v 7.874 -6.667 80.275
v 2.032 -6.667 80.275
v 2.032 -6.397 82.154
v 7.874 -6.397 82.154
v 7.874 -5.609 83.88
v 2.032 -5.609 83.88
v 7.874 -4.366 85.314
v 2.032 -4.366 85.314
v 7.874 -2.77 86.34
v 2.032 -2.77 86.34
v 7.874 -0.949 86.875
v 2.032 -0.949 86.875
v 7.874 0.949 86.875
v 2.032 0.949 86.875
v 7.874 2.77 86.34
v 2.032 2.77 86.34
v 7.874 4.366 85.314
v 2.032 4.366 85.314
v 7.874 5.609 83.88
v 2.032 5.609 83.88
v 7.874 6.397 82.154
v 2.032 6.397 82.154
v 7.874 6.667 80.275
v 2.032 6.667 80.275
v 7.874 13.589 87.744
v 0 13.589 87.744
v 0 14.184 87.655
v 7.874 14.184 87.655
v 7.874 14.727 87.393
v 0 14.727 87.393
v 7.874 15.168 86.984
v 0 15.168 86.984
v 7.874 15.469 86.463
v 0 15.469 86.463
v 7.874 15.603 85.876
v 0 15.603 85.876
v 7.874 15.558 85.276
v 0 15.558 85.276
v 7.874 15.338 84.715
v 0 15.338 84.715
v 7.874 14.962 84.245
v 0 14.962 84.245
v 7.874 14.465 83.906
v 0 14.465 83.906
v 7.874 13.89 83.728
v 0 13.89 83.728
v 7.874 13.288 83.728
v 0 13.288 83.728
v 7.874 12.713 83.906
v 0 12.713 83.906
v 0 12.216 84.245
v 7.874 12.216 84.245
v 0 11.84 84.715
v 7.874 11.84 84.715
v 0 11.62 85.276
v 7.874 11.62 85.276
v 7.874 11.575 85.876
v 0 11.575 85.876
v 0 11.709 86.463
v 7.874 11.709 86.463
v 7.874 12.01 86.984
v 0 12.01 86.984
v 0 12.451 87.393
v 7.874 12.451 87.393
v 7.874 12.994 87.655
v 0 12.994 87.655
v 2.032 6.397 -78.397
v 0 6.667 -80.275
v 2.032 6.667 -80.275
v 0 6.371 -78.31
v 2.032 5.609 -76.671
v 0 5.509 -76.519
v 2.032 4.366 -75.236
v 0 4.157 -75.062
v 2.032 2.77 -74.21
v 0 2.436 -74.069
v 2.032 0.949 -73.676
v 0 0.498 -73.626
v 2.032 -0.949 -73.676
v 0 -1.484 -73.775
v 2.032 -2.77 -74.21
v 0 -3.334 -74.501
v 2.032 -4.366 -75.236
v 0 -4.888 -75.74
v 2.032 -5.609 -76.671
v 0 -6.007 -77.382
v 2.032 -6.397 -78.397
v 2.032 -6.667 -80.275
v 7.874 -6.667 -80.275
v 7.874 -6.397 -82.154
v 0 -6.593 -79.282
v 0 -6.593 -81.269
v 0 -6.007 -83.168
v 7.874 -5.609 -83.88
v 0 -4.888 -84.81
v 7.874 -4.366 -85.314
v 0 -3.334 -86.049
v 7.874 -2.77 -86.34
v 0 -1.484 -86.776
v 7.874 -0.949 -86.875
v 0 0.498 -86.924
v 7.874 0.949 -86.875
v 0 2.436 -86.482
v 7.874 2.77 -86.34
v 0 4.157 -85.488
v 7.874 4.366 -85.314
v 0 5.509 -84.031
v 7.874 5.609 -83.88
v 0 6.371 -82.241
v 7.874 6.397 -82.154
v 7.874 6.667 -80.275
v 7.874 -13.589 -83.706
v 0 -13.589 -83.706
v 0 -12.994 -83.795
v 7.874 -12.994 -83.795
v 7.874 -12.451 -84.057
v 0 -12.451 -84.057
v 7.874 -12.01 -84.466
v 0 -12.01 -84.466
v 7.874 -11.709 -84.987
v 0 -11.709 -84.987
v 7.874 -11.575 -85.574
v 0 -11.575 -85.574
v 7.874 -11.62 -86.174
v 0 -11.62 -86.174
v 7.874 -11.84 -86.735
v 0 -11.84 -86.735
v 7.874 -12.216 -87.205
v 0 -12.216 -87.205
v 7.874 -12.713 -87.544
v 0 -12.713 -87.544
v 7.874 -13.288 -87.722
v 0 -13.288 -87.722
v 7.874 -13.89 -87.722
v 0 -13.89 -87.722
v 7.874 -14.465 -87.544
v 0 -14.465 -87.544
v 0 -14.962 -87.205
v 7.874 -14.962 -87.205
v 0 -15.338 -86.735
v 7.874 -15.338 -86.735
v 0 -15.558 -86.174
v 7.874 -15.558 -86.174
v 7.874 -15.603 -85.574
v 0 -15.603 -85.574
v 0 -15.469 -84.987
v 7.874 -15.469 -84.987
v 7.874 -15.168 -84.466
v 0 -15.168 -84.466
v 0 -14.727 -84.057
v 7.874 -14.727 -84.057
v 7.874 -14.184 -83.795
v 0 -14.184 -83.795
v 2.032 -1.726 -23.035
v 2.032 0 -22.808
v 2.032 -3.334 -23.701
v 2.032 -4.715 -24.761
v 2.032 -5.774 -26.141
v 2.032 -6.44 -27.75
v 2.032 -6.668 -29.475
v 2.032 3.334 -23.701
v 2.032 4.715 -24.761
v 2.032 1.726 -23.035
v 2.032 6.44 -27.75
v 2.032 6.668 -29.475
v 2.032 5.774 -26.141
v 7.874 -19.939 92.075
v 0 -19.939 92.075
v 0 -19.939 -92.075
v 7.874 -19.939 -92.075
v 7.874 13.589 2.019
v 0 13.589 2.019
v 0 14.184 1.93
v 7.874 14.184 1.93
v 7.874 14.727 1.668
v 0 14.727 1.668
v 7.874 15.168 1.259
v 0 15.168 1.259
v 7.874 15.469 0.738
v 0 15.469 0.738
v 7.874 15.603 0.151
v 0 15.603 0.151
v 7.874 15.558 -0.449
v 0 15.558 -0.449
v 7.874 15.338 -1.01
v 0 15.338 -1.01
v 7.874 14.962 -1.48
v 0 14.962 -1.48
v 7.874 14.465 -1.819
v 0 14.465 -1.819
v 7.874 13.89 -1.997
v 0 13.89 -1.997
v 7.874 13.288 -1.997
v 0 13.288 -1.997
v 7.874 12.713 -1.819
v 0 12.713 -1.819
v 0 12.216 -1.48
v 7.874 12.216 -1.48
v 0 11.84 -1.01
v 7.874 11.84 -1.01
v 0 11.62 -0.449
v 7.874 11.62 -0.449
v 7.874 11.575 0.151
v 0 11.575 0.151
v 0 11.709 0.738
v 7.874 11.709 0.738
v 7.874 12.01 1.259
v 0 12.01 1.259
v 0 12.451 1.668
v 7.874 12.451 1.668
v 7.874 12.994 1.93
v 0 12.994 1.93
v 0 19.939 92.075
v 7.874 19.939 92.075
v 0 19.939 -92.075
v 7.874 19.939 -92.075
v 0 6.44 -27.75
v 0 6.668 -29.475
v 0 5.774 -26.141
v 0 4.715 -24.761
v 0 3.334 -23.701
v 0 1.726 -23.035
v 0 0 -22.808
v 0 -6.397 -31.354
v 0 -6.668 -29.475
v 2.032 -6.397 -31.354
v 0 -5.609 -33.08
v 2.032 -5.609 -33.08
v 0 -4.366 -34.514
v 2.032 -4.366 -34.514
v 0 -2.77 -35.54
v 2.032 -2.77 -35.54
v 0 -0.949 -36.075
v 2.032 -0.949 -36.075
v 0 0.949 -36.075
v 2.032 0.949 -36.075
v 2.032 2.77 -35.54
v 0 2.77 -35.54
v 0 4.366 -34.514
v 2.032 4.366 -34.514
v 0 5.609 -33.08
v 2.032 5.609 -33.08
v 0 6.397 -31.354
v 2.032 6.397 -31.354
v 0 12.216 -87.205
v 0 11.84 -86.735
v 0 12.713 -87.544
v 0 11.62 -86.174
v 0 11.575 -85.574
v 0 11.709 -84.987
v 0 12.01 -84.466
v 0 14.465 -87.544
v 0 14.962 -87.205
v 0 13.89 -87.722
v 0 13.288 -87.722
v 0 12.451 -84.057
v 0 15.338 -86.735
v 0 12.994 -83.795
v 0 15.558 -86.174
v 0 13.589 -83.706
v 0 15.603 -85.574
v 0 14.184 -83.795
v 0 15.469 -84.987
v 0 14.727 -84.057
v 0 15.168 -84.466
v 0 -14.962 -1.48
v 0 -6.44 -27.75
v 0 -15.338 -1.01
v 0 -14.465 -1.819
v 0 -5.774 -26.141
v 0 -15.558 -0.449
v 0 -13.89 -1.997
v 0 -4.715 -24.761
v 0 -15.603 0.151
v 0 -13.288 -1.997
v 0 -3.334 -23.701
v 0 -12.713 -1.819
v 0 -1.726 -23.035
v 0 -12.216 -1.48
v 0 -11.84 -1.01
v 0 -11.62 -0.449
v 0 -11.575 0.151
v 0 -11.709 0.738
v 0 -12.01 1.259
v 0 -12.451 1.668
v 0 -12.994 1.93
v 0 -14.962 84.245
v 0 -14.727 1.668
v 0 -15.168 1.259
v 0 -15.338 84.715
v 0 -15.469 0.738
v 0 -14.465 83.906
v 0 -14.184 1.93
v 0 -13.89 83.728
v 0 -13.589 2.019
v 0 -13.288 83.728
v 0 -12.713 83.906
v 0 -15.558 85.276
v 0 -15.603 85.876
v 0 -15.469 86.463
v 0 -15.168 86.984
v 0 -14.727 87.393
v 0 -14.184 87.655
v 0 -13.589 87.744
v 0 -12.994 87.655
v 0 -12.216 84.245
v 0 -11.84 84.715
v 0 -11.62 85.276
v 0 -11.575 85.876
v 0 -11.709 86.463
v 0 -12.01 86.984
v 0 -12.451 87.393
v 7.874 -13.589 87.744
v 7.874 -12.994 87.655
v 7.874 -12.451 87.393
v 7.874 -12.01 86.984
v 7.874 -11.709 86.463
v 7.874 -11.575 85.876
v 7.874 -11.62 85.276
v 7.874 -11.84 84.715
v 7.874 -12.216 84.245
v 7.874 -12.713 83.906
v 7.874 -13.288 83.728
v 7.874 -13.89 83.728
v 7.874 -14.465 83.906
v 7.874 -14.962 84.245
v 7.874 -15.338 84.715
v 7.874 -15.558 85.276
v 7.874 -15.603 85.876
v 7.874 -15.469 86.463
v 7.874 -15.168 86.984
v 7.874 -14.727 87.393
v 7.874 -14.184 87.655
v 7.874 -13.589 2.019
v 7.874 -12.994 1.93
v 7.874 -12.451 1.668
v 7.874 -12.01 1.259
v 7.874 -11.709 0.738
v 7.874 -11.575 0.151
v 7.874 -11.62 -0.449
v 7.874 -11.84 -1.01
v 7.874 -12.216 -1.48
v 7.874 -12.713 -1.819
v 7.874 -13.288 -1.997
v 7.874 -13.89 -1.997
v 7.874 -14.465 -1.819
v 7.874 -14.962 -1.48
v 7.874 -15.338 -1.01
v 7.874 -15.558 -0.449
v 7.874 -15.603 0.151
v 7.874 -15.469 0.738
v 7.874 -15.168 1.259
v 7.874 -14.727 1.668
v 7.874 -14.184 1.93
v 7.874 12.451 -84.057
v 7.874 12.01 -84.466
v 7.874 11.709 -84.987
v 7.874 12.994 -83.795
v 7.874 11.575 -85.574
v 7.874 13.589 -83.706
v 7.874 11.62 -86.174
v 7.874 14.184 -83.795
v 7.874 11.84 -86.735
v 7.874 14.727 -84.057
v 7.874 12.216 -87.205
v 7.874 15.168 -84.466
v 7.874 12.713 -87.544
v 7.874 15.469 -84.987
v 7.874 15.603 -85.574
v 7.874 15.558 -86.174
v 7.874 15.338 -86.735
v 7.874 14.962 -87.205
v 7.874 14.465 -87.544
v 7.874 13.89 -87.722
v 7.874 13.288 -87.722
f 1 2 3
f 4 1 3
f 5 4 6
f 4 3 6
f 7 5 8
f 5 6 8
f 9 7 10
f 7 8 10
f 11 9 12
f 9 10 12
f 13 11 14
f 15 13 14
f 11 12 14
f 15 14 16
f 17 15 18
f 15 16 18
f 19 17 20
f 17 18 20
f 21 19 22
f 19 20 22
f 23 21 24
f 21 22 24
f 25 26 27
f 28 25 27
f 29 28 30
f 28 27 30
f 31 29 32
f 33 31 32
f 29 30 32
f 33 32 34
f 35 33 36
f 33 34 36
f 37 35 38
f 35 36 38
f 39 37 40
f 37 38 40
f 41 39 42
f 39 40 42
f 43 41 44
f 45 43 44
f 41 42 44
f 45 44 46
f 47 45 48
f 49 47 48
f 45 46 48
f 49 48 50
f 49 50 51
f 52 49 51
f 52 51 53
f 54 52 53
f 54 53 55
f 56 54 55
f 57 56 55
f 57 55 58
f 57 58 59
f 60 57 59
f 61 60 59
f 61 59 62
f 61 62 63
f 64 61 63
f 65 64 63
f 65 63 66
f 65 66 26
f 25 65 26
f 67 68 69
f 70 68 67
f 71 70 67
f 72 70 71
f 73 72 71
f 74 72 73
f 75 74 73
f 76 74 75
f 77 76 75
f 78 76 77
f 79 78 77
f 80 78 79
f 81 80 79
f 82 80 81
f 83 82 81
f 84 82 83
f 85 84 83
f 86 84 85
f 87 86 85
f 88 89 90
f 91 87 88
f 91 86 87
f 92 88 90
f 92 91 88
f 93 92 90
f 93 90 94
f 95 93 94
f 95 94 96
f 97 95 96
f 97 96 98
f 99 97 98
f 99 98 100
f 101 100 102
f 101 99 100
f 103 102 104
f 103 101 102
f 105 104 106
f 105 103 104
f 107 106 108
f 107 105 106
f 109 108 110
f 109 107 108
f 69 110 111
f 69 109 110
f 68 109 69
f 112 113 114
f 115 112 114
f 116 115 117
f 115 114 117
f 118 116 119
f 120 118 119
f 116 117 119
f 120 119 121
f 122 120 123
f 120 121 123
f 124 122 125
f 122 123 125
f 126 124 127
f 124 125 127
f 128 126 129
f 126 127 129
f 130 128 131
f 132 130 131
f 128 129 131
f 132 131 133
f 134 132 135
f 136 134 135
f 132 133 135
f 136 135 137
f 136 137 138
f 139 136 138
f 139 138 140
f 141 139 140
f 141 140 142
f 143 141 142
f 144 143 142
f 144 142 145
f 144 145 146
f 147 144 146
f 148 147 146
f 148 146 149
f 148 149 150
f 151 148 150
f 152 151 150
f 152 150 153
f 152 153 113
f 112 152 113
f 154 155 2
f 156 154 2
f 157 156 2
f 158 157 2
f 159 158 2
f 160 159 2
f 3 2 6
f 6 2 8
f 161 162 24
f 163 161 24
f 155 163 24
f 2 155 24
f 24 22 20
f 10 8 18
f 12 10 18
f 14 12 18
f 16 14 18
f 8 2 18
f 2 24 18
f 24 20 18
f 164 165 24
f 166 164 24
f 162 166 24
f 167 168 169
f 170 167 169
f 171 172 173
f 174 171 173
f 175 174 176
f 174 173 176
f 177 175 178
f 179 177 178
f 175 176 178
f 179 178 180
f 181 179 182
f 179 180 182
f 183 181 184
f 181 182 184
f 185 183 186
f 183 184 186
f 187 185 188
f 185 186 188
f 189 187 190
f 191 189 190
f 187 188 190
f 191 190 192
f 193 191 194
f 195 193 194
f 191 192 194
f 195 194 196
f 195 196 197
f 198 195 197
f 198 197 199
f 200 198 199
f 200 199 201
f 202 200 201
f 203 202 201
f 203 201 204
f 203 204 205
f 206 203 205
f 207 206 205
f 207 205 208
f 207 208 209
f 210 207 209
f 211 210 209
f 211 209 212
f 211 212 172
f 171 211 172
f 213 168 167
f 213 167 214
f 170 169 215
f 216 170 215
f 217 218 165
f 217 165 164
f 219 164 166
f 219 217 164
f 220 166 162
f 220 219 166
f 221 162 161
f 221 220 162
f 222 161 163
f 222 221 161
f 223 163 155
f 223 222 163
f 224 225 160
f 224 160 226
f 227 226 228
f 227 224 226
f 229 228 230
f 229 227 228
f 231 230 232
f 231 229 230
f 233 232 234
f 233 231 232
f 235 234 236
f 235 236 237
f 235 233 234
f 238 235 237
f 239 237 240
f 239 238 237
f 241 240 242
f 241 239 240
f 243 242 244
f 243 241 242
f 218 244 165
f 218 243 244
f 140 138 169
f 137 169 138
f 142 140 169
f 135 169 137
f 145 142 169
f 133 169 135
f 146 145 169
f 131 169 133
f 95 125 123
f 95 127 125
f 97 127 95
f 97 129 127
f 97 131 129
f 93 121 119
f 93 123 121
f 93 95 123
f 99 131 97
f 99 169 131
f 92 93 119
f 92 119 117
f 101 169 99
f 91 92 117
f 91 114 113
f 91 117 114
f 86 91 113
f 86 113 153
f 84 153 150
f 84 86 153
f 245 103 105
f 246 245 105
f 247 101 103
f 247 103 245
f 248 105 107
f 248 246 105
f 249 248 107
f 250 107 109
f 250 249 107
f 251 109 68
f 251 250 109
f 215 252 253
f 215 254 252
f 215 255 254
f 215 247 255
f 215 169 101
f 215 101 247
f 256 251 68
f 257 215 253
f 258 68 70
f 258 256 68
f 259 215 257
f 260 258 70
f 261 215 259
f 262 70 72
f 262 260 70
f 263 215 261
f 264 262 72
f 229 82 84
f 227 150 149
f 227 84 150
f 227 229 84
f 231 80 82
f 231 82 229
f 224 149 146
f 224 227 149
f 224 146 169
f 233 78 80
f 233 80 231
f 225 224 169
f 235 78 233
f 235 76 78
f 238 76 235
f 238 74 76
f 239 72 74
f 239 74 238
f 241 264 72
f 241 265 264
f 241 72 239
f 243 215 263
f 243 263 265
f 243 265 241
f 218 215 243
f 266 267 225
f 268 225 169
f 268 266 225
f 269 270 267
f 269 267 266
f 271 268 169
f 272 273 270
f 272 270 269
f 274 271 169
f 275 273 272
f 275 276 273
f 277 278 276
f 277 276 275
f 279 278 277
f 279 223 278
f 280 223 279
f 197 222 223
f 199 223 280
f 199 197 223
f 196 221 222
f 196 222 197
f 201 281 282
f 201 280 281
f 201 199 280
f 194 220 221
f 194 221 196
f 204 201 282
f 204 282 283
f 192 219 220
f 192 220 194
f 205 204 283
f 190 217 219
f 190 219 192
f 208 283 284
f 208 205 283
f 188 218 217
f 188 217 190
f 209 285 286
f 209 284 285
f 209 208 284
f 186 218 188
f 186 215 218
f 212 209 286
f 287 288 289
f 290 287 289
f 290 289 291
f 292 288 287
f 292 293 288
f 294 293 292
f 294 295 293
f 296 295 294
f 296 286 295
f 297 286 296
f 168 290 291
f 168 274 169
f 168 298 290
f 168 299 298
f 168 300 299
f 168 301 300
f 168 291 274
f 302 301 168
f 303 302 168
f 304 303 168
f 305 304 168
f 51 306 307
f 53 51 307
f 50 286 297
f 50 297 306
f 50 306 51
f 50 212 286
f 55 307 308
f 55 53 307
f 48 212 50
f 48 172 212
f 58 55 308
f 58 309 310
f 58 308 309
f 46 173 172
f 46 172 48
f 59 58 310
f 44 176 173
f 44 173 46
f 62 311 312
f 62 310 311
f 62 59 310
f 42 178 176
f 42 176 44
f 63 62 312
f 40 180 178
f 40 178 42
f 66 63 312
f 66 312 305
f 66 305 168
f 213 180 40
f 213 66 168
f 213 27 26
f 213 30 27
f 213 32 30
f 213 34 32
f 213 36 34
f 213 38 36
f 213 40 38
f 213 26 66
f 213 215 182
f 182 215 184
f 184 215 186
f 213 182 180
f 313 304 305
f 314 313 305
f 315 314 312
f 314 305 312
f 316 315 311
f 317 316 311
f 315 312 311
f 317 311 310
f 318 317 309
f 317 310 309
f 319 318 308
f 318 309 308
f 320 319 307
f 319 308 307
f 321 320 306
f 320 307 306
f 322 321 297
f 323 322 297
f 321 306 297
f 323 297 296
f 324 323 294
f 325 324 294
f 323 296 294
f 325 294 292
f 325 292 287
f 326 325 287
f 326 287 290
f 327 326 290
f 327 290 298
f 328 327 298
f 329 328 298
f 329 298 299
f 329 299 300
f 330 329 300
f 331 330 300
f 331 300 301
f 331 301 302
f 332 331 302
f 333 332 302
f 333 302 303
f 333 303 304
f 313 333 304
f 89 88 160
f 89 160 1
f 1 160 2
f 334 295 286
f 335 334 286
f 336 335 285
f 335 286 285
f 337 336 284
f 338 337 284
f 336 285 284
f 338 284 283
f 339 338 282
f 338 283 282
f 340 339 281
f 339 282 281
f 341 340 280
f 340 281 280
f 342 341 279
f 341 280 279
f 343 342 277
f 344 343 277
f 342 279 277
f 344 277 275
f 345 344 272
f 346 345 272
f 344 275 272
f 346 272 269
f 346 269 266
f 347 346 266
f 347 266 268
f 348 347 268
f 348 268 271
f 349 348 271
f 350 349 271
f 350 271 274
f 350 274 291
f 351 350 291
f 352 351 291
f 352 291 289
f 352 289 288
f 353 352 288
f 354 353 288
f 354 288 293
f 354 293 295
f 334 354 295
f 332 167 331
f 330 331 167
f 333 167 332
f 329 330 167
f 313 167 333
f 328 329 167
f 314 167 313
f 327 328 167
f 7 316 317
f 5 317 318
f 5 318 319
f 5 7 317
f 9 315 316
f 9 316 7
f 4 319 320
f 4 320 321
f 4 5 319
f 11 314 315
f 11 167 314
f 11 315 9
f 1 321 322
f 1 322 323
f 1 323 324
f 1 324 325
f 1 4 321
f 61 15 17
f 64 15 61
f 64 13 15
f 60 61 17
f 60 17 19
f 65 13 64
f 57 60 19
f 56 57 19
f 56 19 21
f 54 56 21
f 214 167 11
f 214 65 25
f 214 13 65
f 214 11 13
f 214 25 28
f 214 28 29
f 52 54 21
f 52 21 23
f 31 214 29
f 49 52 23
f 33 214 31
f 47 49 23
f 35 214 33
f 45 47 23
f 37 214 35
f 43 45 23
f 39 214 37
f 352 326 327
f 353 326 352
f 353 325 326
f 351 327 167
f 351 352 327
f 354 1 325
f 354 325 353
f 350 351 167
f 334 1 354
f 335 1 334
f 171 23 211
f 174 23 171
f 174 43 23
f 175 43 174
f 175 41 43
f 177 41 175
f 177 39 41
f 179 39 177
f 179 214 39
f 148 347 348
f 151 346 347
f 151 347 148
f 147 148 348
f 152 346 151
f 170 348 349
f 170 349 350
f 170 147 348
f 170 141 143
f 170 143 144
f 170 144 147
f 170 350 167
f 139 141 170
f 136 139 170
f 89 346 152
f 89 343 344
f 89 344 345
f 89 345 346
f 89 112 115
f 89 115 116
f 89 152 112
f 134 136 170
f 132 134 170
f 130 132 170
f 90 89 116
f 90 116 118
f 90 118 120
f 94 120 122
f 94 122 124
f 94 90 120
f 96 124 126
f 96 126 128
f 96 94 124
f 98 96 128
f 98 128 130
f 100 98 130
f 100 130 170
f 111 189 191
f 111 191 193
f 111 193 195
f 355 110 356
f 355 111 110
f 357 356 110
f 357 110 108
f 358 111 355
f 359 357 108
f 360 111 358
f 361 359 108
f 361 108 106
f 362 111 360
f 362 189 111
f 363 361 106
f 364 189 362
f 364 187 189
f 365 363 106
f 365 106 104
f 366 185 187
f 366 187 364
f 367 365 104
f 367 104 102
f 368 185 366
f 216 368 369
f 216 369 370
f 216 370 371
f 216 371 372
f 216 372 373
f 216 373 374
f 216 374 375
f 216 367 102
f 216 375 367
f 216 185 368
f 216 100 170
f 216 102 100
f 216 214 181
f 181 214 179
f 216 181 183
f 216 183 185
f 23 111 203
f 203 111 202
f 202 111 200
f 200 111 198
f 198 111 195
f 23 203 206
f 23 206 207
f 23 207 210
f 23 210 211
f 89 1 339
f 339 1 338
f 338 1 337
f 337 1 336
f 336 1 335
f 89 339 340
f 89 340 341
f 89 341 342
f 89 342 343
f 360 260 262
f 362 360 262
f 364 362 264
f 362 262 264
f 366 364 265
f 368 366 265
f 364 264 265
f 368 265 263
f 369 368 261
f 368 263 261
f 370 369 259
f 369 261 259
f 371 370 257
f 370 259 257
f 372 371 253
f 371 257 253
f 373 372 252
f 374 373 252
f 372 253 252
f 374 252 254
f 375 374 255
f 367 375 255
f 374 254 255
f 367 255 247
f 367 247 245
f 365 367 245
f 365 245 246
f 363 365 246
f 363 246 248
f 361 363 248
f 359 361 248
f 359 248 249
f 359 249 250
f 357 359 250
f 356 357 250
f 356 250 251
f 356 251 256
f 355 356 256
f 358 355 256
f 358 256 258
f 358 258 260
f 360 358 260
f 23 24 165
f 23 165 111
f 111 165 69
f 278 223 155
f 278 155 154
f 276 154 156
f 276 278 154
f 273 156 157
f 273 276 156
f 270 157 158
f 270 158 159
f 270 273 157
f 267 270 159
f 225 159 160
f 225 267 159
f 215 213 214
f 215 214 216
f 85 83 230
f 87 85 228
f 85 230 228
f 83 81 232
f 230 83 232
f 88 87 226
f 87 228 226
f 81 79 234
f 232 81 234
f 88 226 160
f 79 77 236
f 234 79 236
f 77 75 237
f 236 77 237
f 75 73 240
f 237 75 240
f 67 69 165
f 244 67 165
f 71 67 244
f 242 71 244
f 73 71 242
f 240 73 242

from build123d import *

# Parameters (mm, degrees)
SKETCH1_W              = 184.15
SKETCH1_H              = 39.878
BOSS_EXTRUDE1_DEPTH    = 7.874
F_10_32_TAPPED_HOLE1_D = 4.0386
BOSS_EXTRUDE2_DEPTH    = 2.032


with BuildPart() as part:
    # Sketch1 → Boss-Extrude1 (new body)
    with BuildSketch(Plane(origin=(0, 0, 0), x_dir=(0, 0, -1), z_dir=(1, 0, 0))):
        Rectangle(SKETCH1_W, SKETCH1_H)
        with BuildLine():
            Line((-80.27524839, 6.6675), (80.27524839, 6.6675))
            ThreePointArc((80.27524839, 6.6675), (86.94274839, 0), (80.27524839, -6.6675))
            Line((80.27524839, -6.6675), (-80.27524839, -6.6675))
            ThreePointArc((-80.27524839, -6.6675), (-86.94274839, 0), (-80.27524839, 6.6675))
        make_face(mode=Mode.SUBTRACT)
    extrude(amount=BOSS_EXTRUDE1_DEPTH)

    # #10-32 Tapped Hole1 (through all)
    with Locations(Plane(origin=(7.874, 0, 0), x_dir=(0, 0, -1), z_dir=(1, 0, 0))):
        with Locations((-85.725, 13.589), (-85.725, -13.589), (0, -13.589), (85.725, -13.589), (85.725, 13.589), (0, 13.589)):
            Hole(F_10_32_TAPPED_HOLE1_D / 2)

    # Sketch5 → Boss-Extrude2 (add)
    with BuildSketch(Plane.ZY):
        with BuildLine():
            ThreePointArc((-80.27524839, 6.6675), (-73.60774839, 0), (-80.27524839, -6.6675))
            Line((-80.27524839, -6.6675), (-29.47524839, -6.6675))
            ThreePointArc((-29.47524839, -6.6675), (-36.14274839, -3e-09), (-29.475248395, 6.6675))
            Line((-29.475248395, 6.6675), (-80.27524839, 6.6675))
        make_face()
        with BuildLine():
            ThreePointArc((-22.80774839, 0), (-24.760613926, -4.714634464), (-29.47524839, -6.6675))
            Line((-29.47524839, -6.6675), (80.27524839, -6.6675))
            ThreePointArc((80.27524839, -6.6675), (86.94274839, 0), (80.27524839, 6.6675))
            Line((80.27524839, 6.6675), (-29.475248395, 6.6675))
            ThreePointArc((-29.475248395, 6.6675), (-24.760613928, 4.714634465), (-22.80774839, 0))
        make_face()
    extrude(amount=-BOSS_EXTRUDE2_DEPTH)


solid = part.part
